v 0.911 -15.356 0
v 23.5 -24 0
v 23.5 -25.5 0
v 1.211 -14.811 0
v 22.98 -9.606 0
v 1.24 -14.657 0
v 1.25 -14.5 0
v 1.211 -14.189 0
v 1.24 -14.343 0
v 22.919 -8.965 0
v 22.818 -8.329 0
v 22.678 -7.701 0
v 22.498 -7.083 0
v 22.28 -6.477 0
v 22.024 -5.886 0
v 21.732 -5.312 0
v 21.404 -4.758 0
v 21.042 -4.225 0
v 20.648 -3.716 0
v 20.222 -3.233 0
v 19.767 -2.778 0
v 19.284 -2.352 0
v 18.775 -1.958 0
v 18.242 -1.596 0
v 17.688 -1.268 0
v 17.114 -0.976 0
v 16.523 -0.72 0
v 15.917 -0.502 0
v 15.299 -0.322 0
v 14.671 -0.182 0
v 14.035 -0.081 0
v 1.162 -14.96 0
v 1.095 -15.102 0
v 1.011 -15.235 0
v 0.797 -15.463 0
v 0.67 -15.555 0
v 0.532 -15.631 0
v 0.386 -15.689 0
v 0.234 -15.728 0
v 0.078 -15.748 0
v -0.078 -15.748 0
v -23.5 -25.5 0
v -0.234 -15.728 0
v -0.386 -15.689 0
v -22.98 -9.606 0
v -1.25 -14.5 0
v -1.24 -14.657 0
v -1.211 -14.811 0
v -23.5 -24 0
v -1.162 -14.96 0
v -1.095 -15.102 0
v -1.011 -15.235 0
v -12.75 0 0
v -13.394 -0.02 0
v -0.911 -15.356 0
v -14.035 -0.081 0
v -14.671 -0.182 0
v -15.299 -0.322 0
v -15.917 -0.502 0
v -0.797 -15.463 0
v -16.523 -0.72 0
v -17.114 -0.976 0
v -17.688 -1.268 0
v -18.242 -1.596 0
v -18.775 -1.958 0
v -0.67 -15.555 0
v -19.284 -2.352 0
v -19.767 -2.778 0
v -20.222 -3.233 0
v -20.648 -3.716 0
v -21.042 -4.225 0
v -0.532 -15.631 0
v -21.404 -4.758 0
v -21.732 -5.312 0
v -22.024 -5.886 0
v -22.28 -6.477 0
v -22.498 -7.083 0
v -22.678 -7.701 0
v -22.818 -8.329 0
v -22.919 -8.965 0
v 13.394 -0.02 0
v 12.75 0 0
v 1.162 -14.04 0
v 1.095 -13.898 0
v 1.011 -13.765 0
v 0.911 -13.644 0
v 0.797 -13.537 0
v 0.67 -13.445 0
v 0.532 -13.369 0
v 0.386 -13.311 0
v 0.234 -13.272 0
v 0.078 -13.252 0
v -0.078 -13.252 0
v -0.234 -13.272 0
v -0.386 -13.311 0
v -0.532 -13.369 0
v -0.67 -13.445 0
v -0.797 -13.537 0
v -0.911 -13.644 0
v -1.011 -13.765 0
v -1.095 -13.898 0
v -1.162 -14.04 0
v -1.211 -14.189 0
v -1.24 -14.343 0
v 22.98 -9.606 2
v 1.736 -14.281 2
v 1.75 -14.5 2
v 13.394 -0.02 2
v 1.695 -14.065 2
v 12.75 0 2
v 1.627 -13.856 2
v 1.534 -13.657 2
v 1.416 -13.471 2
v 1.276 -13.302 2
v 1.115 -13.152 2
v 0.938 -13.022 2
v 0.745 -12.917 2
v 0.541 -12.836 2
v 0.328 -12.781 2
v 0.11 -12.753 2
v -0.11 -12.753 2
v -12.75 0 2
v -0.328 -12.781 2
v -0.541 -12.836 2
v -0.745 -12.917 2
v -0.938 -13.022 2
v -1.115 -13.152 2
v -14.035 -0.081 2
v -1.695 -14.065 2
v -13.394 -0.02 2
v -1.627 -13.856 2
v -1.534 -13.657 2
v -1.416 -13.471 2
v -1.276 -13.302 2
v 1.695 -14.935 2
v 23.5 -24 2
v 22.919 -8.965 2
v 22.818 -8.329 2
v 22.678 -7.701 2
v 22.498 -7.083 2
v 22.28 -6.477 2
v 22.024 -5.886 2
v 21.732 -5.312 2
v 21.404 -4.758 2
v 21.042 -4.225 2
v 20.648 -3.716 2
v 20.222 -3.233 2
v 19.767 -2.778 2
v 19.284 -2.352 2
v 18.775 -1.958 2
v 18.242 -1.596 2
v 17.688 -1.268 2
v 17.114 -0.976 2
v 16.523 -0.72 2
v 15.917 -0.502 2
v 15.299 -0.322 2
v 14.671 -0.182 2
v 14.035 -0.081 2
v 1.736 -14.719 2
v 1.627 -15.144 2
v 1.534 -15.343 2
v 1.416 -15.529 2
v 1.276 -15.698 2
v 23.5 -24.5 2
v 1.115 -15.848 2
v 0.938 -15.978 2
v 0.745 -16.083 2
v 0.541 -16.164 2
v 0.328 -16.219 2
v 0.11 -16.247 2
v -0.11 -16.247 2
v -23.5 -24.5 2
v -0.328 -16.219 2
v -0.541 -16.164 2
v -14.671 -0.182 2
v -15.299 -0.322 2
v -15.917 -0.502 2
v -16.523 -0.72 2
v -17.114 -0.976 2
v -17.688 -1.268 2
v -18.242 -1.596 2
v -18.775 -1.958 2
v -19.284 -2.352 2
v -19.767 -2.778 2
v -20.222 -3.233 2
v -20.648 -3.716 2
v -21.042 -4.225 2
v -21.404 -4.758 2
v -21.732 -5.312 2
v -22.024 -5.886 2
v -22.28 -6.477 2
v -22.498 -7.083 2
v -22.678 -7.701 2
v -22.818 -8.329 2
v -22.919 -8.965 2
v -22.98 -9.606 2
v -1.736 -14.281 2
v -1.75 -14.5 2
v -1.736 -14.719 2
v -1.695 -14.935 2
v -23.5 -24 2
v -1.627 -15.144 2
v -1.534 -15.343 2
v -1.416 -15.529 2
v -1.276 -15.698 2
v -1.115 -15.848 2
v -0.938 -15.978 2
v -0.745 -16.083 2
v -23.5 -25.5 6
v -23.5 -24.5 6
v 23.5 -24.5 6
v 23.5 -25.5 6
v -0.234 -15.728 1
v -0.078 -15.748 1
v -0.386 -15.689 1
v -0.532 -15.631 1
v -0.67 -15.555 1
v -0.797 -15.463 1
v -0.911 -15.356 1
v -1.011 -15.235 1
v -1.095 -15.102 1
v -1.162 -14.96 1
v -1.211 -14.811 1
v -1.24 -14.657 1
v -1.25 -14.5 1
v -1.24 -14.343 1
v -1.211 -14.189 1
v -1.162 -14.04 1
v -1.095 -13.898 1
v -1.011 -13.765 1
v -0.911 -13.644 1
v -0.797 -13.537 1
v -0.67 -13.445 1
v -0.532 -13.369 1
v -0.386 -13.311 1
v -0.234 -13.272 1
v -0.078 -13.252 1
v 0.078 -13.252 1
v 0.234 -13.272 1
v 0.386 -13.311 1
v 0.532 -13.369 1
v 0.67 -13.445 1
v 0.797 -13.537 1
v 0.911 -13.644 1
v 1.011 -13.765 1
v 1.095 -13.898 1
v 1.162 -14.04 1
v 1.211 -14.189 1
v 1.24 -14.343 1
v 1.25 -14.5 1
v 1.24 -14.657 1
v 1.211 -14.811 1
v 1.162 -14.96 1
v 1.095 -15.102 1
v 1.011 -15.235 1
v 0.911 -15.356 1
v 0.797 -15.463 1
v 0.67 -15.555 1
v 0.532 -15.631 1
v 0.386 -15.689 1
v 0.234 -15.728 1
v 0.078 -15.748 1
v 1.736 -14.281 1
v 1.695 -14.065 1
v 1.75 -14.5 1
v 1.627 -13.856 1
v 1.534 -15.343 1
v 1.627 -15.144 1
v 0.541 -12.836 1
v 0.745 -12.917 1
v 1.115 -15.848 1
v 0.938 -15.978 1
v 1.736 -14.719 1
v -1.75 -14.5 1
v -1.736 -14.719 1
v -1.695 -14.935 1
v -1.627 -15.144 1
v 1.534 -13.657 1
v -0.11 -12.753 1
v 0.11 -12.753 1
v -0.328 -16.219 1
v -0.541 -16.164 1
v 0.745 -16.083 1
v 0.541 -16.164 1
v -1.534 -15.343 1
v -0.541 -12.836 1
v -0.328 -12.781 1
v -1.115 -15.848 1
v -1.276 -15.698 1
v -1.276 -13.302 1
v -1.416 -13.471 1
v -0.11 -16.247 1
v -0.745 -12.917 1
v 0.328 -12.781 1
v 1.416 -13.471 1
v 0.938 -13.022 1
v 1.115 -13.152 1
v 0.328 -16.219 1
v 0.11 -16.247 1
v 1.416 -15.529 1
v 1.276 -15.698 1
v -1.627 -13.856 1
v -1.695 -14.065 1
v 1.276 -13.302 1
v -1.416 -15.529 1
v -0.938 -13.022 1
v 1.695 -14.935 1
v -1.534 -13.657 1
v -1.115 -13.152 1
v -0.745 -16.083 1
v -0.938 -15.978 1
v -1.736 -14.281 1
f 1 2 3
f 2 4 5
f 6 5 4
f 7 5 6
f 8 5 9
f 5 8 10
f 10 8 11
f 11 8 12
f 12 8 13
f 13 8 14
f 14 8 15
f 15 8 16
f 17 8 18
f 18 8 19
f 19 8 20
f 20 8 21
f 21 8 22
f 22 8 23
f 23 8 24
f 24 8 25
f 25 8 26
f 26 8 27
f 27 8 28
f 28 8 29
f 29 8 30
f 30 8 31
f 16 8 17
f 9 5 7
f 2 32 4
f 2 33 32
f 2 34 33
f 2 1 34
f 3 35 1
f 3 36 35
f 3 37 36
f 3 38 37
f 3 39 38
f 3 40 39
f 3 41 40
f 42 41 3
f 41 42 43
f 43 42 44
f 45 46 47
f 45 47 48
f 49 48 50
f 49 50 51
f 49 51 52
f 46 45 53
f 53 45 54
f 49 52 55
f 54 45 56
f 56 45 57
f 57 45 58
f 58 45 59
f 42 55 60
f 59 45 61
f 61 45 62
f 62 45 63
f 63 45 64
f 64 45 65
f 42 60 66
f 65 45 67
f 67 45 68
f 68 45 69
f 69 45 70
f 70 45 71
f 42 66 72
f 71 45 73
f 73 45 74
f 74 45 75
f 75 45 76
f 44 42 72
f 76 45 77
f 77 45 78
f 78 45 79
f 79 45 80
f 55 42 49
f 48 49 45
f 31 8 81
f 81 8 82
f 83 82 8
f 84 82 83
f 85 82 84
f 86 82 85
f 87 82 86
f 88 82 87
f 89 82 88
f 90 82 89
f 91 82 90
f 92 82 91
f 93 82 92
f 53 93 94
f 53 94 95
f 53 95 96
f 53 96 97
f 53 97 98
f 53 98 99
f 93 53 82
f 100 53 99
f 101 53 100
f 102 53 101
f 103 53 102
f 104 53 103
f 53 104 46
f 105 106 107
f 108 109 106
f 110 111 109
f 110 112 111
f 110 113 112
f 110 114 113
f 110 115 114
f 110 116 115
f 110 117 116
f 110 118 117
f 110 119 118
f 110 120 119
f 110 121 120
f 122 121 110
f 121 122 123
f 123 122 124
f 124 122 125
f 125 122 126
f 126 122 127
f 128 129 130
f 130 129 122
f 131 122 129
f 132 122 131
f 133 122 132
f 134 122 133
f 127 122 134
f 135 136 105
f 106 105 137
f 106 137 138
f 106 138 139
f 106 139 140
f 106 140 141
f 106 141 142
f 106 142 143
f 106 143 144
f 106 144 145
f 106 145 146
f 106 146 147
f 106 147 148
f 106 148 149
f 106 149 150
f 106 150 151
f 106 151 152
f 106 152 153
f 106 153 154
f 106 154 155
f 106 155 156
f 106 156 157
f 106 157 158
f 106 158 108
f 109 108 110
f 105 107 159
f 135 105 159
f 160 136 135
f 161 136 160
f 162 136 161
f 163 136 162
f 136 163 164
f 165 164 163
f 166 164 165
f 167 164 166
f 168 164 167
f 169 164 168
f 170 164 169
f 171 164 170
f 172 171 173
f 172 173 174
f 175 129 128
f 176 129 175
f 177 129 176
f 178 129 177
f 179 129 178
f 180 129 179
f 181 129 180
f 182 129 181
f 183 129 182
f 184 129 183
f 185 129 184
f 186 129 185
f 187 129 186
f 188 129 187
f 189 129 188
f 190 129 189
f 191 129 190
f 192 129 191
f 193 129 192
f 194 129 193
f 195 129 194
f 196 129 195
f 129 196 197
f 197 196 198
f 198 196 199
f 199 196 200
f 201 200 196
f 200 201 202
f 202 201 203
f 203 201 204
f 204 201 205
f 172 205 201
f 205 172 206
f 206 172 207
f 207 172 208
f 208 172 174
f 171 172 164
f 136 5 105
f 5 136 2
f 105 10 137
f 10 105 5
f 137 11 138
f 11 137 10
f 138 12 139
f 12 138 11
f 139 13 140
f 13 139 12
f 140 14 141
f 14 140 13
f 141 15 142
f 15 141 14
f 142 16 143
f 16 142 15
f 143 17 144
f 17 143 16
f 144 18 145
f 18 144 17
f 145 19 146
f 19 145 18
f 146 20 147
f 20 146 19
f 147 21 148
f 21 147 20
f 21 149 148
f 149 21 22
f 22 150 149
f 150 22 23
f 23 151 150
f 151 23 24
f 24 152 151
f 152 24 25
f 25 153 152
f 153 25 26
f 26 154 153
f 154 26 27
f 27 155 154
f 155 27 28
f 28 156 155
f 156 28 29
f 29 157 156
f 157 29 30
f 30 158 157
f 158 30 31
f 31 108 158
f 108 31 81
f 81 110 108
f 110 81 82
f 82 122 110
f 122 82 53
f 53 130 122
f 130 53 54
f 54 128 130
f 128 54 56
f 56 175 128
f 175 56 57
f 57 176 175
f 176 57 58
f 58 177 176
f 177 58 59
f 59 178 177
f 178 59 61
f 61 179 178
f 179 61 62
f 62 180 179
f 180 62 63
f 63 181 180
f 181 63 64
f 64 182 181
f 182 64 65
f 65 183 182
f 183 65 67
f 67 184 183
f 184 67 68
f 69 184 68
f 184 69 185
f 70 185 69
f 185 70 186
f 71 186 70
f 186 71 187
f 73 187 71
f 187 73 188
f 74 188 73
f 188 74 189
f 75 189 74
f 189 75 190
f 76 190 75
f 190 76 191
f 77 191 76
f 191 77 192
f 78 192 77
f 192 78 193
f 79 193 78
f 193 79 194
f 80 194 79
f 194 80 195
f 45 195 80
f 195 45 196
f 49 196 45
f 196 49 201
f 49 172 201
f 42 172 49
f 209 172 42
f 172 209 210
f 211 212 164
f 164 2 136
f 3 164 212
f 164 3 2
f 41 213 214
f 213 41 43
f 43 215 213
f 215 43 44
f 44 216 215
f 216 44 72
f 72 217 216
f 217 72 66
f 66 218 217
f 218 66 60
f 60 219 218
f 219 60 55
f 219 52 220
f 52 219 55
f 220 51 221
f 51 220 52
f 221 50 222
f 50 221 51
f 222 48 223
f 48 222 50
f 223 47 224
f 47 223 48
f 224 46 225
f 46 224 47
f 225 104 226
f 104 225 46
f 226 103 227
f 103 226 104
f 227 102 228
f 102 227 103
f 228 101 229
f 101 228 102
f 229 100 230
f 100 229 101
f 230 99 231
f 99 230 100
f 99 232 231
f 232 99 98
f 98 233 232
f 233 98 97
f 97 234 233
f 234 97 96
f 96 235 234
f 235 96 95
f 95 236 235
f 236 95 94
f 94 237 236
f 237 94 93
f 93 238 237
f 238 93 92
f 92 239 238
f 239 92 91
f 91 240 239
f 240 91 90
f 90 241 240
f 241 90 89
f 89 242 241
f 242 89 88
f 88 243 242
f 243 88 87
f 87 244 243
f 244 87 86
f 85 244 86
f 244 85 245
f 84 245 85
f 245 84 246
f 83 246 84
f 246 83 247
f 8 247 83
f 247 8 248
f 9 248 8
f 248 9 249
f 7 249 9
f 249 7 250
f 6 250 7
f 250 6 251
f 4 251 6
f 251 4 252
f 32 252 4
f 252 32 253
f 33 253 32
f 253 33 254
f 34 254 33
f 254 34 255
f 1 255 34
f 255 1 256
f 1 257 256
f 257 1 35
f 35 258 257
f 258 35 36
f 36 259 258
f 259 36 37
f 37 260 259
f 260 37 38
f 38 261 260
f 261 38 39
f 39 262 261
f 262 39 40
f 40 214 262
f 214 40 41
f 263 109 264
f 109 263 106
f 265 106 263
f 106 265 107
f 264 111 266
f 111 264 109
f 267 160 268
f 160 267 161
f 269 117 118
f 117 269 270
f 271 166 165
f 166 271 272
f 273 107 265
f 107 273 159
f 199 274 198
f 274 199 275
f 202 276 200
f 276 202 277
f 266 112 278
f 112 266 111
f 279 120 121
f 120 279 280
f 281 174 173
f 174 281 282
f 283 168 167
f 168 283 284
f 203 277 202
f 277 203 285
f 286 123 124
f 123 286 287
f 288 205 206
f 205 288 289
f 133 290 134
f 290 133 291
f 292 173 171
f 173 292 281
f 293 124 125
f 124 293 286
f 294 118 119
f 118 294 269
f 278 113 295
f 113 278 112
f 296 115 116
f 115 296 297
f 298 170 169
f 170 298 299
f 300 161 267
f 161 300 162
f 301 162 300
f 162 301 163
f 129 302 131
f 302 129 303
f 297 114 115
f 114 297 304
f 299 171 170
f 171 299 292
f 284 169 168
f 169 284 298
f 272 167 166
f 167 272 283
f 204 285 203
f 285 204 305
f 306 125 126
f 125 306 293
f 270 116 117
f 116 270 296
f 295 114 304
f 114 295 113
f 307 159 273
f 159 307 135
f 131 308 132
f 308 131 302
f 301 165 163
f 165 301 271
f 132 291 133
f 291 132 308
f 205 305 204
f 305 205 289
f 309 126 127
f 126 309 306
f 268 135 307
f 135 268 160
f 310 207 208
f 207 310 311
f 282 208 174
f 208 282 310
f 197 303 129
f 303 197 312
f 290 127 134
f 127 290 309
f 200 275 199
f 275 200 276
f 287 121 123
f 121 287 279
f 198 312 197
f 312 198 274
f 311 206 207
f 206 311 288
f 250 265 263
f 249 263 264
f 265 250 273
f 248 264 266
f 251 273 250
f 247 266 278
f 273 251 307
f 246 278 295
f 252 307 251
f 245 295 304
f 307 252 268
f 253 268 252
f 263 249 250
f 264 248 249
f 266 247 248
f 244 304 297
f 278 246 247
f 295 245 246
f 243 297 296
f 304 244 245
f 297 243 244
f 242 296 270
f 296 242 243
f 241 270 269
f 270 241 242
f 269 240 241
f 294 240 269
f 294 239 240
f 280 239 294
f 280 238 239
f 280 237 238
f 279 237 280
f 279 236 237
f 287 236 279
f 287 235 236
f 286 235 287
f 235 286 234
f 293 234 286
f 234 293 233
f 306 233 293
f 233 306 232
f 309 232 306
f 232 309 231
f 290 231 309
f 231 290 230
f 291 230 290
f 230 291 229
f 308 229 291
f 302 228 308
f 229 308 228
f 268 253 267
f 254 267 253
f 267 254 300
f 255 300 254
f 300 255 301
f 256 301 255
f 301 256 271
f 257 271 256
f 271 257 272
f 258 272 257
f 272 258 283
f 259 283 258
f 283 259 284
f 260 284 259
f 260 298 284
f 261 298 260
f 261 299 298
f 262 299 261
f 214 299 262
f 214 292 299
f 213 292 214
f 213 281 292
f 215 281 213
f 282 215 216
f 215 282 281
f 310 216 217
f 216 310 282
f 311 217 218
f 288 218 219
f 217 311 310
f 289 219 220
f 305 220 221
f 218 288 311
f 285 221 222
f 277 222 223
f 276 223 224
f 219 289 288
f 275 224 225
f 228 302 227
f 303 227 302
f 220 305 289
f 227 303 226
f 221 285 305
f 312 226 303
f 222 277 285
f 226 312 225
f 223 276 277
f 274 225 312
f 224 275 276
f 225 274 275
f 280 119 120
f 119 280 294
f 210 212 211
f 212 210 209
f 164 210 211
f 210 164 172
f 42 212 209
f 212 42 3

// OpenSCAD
size_x=47;
hole_off=14.5;
circle_dist=26.5;
radius=(size_x-circle_dist)/2;
size_y=25;

difference(){
linear_extrude(height=2)difference(){
	hull()union(){
		for(i=[-1,1]) {
			translate([i*(size_x-2*radius)/2-i*0.5,-radius])circle(r=radius,$fn=100);
		}
		translate([0,-24.5])square([size_x,1],center=true);
	}
	translate([0,-hole_off])circle(d=2.5,$fn=50);
}
translate([0,-hole_off,1])cylinder(r=3.5/2,$fn=50);
}
linear_extrude(height=6)translate([0,-25])square([size_x,1],center=true);
